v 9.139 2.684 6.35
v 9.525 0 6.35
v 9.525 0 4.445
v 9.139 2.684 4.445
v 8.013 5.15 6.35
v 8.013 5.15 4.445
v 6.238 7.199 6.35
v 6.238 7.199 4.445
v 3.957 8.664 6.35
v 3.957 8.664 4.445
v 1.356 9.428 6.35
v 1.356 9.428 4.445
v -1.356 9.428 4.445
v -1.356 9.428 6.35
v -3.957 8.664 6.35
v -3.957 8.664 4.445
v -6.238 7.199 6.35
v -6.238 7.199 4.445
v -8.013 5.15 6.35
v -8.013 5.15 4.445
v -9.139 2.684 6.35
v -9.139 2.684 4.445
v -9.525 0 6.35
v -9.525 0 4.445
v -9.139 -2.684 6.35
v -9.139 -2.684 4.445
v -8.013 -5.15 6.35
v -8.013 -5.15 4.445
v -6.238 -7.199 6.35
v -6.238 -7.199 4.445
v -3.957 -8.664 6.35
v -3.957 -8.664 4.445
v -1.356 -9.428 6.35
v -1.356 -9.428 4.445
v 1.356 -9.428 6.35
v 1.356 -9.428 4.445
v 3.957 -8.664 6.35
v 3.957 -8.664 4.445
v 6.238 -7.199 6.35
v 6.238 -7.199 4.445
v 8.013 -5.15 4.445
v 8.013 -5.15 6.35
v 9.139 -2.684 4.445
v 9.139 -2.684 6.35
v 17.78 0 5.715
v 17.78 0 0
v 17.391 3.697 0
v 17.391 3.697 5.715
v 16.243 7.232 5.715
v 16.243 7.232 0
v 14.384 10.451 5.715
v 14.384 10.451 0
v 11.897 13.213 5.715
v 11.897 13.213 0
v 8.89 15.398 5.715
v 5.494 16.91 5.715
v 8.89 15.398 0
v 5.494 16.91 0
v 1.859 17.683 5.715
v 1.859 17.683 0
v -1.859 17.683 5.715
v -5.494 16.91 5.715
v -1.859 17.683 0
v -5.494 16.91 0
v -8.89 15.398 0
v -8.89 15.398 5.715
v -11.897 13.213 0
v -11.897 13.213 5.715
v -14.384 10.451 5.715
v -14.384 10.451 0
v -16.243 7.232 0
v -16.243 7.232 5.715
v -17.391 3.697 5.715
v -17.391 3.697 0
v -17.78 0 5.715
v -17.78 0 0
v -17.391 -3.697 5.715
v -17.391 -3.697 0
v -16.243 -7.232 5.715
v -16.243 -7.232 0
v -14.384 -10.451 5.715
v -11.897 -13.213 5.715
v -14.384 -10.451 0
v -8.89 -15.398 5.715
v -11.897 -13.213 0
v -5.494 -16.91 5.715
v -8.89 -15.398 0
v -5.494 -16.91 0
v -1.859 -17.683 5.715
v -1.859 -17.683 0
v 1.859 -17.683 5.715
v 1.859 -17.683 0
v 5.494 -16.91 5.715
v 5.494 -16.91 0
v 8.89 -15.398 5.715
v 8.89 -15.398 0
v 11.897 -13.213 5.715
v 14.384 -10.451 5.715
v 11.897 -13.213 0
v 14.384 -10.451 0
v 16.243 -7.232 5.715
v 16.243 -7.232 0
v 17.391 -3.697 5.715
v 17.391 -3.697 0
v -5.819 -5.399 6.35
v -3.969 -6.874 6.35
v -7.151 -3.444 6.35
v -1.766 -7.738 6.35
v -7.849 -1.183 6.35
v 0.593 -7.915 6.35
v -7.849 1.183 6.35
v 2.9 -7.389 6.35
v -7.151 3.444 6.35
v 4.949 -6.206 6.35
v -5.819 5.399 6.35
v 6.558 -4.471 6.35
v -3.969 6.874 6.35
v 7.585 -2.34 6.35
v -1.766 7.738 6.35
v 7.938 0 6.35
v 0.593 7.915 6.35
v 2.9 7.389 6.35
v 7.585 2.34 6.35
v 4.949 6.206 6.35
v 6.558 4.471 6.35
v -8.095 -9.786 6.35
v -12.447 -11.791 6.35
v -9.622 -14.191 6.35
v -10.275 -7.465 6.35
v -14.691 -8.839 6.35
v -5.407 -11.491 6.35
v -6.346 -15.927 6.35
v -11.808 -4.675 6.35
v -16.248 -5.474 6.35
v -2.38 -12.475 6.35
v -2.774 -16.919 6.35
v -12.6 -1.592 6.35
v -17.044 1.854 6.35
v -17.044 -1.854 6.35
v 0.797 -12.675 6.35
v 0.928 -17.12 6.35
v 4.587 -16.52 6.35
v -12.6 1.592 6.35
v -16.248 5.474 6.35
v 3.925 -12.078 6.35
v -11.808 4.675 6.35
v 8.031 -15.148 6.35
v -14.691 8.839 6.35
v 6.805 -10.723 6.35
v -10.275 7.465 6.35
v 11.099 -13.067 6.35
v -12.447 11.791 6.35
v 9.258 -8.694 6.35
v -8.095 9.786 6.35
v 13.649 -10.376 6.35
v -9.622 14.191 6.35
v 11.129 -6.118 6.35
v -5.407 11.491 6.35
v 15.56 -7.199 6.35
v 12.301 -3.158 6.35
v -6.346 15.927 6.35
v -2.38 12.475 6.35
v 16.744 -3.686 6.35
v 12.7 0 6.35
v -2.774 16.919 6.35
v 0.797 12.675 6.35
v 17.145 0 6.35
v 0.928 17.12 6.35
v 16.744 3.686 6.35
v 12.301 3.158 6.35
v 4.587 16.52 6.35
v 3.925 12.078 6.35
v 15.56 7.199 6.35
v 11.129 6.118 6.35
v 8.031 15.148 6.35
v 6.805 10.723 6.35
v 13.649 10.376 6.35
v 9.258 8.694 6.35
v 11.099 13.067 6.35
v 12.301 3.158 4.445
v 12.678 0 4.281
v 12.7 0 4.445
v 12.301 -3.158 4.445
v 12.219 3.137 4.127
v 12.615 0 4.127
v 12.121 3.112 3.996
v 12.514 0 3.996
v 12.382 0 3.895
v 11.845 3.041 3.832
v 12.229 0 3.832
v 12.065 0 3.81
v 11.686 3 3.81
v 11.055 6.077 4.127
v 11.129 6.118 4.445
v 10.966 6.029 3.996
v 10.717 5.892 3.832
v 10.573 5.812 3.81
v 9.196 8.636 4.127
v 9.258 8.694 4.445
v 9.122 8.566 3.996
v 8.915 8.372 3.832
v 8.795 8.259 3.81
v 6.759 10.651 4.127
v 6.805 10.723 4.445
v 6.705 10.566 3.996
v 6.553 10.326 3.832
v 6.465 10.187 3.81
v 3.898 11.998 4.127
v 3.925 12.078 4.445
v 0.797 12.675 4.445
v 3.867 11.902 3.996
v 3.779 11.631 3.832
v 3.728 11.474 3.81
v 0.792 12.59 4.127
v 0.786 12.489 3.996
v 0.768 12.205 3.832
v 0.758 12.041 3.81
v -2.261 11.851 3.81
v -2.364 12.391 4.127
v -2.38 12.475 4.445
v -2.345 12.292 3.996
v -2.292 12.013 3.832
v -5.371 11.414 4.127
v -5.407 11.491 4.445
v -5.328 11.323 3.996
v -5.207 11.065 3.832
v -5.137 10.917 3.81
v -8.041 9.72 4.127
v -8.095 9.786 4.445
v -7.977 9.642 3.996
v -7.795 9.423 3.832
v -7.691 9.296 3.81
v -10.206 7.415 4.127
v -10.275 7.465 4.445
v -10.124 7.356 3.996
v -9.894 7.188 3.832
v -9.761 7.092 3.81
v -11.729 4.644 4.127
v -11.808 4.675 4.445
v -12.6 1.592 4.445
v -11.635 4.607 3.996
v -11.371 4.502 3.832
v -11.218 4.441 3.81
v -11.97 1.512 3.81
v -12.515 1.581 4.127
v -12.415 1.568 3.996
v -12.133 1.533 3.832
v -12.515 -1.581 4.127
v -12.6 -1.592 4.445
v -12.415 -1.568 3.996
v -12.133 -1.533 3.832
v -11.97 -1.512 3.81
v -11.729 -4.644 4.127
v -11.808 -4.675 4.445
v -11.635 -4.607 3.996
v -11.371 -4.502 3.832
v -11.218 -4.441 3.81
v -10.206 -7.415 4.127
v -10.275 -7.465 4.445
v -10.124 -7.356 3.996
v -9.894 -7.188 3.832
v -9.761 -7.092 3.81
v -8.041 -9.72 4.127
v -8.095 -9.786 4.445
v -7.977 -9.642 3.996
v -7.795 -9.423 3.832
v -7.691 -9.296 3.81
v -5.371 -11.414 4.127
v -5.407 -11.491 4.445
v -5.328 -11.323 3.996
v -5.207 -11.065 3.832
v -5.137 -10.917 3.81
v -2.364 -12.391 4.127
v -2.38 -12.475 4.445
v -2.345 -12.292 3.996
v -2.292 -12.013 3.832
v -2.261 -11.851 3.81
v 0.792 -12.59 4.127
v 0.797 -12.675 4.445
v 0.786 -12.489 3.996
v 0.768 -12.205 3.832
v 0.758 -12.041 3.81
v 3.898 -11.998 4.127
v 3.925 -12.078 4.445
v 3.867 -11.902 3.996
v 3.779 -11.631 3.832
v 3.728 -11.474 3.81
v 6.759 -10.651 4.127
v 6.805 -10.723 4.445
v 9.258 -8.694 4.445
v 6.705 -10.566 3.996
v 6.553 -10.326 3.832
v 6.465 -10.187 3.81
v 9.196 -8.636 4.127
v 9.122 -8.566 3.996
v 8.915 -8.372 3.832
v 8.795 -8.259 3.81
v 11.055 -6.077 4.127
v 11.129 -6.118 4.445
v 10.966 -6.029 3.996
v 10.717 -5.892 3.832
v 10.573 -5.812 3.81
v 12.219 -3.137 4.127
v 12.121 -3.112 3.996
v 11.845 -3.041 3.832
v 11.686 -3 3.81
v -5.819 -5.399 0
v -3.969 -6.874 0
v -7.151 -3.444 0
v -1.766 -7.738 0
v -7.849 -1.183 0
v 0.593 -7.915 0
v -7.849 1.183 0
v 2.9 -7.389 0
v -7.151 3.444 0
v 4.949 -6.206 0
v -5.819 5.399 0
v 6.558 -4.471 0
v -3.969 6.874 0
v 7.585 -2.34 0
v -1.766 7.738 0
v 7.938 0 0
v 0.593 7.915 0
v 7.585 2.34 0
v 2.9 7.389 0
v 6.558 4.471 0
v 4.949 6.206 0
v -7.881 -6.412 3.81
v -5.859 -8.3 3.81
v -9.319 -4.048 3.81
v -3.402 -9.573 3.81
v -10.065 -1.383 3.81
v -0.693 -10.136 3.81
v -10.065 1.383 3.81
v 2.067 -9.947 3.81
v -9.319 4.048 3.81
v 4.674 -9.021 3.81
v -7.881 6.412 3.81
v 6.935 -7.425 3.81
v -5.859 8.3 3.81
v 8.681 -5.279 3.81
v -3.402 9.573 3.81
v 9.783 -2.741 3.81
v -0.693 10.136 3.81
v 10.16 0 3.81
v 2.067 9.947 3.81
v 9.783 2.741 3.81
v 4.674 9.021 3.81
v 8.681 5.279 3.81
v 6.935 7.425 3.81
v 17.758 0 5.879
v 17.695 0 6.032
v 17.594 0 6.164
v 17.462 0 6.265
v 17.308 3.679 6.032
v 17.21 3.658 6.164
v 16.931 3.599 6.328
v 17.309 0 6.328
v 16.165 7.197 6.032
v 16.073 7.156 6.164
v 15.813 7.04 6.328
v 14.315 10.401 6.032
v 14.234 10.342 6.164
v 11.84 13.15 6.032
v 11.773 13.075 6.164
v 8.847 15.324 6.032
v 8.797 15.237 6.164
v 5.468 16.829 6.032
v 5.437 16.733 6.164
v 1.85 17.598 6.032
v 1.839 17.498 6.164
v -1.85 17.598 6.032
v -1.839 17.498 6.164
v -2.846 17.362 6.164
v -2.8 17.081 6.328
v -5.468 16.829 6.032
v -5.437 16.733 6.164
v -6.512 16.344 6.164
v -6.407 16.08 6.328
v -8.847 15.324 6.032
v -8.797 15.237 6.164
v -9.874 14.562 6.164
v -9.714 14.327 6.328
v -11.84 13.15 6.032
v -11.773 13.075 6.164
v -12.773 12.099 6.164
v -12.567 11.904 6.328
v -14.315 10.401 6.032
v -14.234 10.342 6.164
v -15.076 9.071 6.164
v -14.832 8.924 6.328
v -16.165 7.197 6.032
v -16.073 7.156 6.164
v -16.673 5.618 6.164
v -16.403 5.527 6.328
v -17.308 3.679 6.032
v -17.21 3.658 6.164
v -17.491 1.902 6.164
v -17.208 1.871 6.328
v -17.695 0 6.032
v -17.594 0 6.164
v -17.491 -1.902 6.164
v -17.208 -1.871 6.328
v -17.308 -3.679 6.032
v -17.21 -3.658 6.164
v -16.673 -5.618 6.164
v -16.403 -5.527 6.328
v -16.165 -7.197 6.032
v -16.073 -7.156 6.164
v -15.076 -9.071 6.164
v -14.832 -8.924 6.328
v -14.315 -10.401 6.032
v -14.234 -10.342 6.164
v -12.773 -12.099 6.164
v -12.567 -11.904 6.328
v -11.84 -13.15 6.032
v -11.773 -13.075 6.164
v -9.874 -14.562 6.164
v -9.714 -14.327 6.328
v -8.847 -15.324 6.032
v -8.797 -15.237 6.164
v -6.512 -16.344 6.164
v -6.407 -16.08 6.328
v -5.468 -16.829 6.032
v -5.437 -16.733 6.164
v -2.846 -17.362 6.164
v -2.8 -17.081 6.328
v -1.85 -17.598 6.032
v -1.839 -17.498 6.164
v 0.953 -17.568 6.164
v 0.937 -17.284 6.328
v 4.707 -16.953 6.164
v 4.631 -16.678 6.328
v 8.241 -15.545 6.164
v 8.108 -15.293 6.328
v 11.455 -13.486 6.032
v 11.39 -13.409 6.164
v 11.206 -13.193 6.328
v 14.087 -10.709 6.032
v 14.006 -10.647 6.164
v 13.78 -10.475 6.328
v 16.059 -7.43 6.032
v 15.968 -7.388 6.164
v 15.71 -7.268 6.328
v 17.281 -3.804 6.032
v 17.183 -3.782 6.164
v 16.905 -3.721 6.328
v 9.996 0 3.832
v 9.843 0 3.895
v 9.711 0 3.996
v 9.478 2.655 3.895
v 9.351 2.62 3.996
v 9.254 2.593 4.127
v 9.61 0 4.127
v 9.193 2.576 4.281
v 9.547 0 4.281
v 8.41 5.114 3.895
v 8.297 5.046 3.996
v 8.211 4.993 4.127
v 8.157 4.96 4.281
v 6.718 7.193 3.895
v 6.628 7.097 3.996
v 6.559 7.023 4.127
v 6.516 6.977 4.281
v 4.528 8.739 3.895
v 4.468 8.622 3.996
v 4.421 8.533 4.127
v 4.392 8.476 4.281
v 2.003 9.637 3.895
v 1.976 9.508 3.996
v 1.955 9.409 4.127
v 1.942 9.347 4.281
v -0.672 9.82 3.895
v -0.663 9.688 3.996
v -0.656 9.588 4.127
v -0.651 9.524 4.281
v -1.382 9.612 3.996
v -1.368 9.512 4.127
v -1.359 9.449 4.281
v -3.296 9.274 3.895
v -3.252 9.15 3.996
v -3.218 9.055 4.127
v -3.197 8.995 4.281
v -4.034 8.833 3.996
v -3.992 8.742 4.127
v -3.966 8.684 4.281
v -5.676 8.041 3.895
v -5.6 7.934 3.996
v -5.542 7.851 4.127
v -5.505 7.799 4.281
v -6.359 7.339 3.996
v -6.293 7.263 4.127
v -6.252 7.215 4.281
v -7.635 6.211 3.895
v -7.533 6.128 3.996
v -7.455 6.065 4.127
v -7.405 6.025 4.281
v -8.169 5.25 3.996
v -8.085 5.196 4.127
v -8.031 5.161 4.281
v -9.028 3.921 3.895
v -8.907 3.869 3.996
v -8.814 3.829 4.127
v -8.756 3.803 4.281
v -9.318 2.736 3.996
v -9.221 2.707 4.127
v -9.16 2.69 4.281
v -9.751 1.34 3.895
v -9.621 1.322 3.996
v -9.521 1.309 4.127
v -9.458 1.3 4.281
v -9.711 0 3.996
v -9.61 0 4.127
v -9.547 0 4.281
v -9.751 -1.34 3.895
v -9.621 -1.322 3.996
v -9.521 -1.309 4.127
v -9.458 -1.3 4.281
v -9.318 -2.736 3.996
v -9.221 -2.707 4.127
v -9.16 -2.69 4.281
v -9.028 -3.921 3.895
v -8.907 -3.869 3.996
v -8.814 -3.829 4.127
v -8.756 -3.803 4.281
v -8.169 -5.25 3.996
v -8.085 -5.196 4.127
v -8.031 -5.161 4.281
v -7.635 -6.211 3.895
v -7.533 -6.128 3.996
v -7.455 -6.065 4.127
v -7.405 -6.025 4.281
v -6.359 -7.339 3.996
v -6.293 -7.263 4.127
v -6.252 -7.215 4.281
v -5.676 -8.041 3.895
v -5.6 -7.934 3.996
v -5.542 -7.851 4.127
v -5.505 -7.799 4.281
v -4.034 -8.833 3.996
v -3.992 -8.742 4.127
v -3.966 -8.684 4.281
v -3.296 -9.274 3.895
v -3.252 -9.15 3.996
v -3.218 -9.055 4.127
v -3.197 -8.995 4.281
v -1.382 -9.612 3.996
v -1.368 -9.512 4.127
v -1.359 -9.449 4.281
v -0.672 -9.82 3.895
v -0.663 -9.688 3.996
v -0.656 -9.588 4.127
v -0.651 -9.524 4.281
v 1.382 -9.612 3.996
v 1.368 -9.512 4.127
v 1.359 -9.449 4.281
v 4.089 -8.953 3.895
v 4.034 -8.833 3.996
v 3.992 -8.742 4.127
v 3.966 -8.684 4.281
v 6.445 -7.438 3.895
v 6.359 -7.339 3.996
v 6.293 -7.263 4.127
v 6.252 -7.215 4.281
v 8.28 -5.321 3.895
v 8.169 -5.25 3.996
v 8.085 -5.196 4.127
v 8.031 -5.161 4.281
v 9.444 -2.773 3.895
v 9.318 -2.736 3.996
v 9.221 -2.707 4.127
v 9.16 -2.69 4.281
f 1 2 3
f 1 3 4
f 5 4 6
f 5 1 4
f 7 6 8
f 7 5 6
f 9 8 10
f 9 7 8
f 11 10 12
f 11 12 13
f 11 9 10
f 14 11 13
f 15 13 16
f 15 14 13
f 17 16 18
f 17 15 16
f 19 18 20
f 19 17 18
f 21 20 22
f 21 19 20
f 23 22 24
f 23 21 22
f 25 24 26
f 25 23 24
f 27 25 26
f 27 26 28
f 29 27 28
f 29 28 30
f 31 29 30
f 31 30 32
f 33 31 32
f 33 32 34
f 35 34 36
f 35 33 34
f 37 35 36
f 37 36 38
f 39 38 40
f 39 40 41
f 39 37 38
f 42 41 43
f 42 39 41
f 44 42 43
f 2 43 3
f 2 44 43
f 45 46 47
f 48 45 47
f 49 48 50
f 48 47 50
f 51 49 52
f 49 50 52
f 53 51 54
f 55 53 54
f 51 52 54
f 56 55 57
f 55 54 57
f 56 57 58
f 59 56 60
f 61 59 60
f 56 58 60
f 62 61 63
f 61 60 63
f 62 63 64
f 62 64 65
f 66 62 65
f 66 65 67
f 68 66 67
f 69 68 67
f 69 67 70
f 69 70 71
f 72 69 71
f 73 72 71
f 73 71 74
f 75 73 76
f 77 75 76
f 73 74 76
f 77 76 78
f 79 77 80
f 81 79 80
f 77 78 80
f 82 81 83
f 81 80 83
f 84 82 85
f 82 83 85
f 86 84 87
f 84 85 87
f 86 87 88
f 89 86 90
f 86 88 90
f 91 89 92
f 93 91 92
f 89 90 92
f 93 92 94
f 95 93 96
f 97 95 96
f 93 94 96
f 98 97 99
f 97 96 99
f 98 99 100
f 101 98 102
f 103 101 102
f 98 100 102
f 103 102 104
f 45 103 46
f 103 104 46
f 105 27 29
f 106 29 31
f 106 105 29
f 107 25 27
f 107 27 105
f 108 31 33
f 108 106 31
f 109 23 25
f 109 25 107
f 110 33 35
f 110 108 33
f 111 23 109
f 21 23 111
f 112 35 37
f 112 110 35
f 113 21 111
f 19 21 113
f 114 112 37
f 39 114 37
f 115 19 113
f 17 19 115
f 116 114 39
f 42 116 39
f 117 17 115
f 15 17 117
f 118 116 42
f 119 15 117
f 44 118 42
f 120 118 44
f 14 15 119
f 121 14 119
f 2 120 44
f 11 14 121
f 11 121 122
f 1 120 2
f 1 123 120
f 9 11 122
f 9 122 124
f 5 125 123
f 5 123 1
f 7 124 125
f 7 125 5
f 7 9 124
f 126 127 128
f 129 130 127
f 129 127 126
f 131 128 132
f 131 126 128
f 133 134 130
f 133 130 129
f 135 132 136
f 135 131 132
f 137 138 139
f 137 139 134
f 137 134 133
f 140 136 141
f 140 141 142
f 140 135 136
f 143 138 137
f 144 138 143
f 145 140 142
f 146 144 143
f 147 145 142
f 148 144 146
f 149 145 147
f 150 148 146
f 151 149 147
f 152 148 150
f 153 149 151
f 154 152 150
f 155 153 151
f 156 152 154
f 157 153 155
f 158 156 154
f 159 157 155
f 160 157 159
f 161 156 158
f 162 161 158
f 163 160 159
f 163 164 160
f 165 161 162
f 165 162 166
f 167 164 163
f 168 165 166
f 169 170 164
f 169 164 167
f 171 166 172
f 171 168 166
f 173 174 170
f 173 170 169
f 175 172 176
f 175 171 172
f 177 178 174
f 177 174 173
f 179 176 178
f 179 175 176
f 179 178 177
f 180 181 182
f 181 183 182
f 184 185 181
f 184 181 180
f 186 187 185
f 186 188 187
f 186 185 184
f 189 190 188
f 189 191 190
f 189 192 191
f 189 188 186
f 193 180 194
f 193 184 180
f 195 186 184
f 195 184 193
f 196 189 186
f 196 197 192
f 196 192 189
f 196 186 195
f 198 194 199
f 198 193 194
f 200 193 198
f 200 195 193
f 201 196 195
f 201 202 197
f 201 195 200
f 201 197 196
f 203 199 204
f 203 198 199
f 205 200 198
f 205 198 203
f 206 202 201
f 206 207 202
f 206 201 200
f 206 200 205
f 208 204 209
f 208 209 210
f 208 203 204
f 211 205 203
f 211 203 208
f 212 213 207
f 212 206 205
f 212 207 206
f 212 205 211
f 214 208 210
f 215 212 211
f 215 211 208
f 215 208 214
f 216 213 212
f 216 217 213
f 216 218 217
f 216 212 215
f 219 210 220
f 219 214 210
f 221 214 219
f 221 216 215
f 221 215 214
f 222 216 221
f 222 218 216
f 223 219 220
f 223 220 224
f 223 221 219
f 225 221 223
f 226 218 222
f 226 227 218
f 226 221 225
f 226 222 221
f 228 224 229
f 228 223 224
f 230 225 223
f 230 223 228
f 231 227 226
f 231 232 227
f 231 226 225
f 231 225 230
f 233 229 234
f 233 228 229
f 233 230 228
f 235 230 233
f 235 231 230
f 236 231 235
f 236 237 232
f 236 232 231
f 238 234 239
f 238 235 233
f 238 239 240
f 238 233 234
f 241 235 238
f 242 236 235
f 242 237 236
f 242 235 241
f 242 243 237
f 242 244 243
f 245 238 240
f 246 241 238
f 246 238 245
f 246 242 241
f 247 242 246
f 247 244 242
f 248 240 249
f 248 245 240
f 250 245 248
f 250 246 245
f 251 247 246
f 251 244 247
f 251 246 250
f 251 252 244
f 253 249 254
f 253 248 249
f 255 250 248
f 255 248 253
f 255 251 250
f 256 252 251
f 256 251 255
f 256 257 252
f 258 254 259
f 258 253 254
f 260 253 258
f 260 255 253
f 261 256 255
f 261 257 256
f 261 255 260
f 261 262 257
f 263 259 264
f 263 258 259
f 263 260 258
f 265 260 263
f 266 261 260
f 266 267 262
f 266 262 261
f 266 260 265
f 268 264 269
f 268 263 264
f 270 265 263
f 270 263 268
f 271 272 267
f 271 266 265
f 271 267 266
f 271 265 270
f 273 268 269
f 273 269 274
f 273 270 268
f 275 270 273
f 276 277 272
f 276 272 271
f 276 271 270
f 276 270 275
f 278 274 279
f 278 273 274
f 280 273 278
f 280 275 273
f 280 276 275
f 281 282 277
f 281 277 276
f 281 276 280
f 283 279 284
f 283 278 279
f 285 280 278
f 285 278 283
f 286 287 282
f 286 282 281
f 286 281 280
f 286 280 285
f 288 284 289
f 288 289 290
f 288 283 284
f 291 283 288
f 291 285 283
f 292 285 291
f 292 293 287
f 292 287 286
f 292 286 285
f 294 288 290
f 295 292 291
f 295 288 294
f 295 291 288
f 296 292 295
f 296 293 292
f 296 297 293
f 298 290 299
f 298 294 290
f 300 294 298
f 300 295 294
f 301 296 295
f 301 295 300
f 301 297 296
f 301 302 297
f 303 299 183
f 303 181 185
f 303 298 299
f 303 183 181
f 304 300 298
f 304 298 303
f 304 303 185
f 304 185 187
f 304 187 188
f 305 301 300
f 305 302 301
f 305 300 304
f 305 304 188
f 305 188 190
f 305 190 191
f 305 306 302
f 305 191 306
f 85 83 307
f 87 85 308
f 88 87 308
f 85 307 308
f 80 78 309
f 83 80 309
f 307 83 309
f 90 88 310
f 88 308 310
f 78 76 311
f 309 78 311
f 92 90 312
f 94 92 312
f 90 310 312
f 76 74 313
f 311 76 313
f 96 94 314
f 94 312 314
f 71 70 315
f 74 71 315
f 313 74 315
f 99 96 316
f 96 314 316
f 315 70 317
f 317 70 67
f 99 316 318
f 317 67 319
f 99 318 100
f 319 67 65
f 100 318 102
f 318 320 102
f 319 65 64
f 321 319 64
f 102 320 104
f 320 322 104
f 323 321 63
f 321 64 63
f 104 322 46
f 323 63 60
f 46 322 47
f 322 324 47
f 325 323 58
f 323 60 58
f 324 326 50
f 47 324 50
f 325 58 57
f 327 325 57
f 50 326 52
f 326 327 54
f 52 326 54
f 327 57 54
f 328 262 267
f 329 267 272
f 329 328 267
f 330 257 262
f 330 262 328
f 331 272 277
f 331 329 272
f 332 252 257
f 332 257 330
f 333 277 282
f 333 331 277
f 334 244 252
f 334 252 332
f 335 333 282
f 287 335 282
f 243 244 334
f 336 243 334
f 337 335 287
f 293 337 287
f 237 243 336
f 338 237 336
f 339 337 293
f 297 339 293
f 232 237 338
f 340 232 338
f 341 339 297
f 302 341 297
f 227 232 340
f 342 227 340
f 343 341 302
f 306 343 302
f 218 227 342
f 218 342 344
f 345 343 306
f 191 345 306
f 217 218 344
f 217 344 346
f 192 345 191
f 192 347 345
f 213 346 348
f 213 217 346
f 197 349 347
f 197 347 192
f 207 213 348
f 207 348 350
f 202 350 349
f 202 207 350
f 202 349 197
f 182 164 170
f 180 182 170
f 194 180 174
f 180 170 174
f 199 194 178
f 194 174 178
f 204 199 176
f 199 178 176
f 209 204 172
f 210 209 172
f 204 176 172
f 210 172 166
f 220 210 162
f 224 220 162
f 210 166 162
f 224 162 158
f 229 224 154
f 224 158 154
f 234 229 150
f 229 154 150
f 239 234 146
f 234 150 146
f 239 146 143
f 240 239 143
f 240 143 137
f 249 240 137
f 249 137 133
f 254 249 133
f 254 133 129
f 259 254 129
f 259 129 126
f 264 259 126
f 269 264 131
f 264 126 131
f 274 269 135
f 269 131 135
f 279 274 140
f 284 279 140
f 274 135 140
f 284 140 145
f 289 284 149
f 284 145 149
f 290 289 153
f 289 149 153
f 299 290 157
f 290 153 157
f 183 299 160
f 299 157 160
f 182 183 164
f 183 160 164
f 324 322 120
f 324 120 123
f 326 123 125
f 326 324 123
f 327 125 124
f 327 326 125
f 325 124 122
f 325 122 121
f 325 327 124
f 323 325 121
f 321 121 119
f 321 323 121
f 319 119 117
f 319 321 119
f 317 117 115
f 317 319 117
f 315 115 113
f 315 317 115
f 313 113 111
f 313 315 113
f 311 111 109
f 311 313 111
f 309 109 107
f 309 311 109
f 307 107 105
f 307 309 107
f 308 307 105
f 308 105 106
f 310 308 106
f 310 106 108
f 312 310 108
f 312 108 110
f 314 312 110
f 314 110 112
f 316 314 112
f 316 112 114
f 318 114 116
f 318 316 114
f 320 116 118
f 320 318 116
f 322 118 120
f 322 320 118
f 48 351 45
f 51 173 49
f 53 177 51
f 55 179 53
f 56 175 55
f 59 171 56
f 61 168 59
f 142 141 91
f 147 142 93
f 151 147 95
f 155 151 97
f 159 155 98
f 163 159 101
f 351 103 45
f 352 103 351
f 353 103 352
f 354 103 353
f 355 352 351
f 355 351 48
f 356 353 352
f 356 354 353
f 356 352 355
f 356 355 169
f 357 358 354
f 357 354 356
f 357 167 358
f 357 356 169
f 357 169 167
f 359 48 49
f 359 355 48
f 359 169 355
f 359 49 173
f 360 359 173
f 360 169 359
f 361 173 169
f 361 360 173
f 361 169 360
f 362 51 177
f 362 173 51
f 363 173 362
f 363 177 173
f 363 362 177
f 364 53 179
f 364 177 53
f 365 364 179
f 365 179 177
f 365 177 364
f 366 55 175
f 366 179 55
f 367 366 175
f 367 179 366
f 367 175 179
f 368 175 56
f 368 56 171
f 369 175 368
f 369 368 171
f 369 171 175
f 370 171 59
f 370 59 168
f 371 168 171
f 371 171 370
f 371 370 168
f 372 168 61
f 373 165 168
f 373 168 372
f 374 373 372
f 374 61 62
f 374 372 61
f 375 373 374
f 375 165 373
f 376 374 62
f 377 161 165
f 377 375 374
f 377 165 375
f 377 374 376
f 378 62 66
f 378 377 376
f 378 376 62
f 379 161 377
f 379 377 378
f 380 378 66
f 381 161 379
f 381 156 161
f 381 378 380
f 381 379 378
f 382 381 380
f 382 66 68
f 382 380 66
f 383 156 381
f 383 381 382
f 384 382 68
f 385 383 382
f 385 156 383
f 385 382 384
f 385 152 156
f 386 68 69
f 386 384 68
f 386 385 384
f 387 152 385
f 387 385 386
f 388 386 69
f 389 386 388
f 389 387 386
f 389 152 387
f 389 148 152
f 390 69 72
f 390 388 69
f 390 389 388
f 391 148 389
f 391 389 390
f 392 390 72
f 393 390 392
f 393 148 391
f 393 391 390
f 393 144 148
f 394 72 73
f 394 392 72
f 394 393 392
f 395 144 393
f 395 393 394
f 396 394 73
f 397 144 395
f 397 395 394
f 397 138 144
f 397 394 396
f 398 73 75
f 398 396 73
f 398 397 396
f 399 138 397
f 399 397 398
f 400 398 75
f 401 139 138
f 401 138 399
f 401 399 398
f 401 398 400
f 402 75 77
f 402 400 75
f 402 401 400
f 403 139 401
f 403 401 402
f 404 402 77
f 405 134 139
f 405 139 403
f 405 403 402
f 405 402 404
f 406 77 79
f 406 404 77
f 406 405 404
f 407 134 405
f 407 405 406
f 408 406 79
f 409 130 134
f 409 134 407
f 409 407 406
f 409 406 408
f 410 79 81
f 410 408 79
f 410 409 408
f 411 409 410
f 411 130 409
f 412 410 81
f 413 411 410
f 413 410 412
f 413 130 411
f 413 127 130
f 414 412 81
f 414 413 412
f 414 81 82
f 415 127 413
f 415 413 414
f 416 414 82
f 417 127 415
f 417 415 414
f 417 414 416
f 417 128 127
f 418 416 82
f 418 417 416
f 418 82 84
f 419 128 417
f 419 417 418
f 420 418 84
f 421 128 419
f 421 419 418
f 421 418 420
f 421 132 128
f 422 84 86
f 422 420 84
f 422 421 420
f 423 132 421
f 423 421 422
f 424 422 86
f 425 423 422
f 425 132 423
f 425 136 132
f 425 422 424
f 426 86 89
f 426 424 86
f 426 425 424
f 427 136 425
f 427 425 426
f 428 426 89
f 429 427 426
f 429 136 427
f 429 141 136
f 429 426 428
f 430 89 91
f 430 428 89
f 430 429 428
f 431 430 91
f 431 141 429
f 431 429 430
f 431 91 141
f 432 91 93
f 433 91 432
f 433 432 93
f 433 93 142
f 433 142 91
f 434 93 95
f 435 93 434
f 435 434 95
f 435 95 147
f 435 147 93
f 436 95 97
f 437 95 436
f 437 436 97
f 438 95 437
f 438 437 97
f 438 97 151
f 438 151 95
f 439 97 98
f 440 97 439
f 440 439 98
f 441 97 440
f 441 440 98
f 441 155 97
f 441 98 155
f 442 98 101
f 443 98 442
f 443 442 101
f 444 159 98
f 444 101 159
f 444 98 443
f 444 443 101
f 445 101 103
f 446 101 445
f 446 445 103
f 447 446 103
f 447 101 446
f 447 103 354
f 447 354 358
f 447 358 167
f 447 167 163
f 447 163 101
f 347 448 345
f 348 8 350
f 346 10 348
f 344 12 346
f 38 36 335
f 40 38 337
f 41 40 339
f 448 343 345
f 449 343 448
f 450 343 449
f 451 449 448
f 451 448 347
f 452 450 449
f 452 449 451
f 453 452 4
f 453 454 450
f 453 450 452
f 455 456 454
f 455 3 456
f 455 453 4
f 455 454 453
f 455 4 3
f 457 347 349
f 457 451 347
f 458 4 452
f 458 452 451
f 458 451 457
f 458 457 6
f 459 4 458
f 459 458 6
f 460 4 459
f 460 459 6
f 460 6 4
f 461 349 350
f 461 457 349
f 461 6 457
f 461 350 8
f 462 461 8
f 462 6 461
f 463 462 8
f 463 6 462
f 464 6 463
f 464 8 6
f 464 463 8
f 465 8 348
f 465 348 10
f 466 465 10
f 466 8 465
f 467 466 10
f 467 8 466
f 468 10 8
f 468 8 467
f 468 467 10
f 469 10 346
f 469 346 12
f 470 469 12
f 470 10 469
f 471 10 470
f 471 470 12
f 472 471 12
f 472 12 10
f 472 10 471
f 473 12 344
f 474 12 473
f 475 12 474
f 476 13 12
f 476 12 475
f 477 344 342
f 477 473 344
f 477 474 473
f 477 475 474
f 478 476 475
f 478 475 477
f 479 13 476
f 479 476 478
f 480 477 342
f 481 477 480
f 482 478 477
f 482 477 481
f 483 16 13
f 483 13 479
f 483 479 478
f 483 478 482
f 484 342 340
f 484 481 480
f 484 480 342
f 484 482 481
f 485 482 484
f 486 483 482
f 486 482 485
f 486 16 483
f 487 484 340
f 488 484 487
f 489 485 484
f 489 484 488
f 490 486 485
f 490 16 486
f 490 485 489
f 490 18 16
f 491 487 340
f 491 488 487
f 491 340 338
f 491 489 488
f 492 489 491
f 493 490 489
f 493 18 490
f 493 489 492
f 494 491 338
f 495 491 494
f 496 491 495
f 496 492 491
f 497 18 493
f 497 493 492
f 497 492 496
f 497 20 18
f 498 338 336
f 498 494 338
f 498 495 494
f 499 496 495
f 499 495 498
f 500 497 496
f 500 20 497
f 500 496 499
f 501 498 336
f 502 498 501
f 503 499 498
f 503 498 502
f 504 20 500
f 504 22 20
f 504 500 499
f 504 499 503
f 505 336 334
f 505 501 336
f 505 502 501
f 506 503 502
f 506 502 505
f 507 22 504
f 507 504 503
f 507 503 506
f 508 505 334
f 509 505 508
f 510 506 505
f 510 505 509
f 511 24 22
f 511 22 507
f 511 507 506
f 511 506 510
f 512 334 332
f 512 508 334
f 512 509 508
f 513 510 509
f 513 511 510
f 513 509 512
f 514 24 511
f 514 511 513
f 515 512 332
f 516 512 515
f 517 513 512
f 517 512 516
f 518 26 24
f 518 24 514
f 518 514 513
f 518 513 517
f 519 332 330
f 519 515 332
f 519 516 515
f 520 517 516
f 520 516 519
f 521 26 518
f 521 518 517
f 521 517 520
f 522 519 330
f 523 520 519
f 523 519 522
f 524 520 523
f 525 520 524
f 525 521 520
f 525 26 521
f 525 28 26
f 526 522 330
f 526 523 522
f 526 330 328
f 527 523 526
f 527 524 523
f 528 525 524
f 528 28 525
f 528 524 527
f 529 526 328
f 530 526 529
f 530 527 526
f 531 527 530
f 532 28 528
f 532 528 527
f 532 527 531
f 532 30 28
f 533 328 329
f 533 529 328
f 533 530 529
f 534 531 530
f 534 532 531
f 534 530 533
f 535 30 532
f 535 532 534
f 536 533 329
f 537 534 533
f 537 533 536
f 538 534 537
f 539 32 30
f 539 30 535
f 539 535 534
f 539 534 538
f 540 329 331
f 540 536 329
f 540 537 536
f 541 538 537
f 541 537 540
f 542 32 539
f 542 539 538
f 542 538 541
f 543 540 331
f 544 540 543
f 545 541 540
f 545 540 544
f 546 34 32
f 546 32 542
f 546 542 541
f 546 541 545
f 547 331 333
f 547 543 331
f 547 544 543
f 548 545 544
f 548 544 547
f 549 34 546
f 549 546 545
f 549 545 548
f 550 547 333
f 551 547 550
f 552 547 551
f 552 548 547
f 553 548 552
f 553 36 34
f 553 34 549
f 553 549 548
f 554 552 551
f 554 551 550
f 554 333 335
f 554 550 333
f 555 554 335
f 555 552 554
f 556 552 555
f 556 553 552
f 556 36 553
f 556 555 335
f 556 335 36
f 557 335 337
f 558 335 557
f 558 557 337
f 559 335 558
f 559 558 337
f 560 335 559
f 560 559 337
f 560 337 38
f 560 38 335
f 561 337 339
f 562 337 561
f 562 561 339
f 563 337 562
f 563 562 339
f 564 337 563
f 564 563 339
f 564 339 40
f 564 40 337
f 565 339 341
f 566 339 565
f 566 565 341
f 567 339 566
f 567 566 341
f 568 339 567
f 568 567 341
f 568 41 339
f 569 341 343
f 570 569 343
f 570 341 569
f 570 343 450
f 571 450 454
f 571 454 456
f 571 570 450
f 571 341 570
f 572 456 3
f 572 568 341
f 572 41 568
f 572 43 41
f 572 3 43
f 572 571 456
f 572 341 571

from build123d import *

# Parameters (mm, degrees)
F0_R     = 17.78
F0_R_2   = 7.9375
F1_DEPTH = 6.35
F2_R     = 12.7
F2_R_2   = 9.525
F3_DEPTH = 2.54
F4_R     = 0.635


with BuildPart() as f1:
    # F0 (on Top) → F1 (new body)
    with BuildSketch(Plane.XY):
        Circle(F0_R)
        Circle(F0_R_2, mode=Mode.SUBTRACT)
    extrude(amount=F1_DEPTH)

    # F2 (on face) → F3 (cut)
    with BuildSketch(Plane.XY.offset(6.35)):
        Circle(F2_R)
        Circle(F2_R_2, mode=Mode.SUBTRACT)
    extrude(amount=-F3_DEPTH, mode=Mode.SUBTRACT)

    # F4
    f4_edges = [f1.edges().sort_by_distance(p)[0] for p in [
        (-17.78, 0, 6.35),
        (-12.7, 0, 3.81),
        (-9.525, 0, 3.81),
    ]]
    fillet(f4_edges, radius=F4_R)


solid = f1.part
